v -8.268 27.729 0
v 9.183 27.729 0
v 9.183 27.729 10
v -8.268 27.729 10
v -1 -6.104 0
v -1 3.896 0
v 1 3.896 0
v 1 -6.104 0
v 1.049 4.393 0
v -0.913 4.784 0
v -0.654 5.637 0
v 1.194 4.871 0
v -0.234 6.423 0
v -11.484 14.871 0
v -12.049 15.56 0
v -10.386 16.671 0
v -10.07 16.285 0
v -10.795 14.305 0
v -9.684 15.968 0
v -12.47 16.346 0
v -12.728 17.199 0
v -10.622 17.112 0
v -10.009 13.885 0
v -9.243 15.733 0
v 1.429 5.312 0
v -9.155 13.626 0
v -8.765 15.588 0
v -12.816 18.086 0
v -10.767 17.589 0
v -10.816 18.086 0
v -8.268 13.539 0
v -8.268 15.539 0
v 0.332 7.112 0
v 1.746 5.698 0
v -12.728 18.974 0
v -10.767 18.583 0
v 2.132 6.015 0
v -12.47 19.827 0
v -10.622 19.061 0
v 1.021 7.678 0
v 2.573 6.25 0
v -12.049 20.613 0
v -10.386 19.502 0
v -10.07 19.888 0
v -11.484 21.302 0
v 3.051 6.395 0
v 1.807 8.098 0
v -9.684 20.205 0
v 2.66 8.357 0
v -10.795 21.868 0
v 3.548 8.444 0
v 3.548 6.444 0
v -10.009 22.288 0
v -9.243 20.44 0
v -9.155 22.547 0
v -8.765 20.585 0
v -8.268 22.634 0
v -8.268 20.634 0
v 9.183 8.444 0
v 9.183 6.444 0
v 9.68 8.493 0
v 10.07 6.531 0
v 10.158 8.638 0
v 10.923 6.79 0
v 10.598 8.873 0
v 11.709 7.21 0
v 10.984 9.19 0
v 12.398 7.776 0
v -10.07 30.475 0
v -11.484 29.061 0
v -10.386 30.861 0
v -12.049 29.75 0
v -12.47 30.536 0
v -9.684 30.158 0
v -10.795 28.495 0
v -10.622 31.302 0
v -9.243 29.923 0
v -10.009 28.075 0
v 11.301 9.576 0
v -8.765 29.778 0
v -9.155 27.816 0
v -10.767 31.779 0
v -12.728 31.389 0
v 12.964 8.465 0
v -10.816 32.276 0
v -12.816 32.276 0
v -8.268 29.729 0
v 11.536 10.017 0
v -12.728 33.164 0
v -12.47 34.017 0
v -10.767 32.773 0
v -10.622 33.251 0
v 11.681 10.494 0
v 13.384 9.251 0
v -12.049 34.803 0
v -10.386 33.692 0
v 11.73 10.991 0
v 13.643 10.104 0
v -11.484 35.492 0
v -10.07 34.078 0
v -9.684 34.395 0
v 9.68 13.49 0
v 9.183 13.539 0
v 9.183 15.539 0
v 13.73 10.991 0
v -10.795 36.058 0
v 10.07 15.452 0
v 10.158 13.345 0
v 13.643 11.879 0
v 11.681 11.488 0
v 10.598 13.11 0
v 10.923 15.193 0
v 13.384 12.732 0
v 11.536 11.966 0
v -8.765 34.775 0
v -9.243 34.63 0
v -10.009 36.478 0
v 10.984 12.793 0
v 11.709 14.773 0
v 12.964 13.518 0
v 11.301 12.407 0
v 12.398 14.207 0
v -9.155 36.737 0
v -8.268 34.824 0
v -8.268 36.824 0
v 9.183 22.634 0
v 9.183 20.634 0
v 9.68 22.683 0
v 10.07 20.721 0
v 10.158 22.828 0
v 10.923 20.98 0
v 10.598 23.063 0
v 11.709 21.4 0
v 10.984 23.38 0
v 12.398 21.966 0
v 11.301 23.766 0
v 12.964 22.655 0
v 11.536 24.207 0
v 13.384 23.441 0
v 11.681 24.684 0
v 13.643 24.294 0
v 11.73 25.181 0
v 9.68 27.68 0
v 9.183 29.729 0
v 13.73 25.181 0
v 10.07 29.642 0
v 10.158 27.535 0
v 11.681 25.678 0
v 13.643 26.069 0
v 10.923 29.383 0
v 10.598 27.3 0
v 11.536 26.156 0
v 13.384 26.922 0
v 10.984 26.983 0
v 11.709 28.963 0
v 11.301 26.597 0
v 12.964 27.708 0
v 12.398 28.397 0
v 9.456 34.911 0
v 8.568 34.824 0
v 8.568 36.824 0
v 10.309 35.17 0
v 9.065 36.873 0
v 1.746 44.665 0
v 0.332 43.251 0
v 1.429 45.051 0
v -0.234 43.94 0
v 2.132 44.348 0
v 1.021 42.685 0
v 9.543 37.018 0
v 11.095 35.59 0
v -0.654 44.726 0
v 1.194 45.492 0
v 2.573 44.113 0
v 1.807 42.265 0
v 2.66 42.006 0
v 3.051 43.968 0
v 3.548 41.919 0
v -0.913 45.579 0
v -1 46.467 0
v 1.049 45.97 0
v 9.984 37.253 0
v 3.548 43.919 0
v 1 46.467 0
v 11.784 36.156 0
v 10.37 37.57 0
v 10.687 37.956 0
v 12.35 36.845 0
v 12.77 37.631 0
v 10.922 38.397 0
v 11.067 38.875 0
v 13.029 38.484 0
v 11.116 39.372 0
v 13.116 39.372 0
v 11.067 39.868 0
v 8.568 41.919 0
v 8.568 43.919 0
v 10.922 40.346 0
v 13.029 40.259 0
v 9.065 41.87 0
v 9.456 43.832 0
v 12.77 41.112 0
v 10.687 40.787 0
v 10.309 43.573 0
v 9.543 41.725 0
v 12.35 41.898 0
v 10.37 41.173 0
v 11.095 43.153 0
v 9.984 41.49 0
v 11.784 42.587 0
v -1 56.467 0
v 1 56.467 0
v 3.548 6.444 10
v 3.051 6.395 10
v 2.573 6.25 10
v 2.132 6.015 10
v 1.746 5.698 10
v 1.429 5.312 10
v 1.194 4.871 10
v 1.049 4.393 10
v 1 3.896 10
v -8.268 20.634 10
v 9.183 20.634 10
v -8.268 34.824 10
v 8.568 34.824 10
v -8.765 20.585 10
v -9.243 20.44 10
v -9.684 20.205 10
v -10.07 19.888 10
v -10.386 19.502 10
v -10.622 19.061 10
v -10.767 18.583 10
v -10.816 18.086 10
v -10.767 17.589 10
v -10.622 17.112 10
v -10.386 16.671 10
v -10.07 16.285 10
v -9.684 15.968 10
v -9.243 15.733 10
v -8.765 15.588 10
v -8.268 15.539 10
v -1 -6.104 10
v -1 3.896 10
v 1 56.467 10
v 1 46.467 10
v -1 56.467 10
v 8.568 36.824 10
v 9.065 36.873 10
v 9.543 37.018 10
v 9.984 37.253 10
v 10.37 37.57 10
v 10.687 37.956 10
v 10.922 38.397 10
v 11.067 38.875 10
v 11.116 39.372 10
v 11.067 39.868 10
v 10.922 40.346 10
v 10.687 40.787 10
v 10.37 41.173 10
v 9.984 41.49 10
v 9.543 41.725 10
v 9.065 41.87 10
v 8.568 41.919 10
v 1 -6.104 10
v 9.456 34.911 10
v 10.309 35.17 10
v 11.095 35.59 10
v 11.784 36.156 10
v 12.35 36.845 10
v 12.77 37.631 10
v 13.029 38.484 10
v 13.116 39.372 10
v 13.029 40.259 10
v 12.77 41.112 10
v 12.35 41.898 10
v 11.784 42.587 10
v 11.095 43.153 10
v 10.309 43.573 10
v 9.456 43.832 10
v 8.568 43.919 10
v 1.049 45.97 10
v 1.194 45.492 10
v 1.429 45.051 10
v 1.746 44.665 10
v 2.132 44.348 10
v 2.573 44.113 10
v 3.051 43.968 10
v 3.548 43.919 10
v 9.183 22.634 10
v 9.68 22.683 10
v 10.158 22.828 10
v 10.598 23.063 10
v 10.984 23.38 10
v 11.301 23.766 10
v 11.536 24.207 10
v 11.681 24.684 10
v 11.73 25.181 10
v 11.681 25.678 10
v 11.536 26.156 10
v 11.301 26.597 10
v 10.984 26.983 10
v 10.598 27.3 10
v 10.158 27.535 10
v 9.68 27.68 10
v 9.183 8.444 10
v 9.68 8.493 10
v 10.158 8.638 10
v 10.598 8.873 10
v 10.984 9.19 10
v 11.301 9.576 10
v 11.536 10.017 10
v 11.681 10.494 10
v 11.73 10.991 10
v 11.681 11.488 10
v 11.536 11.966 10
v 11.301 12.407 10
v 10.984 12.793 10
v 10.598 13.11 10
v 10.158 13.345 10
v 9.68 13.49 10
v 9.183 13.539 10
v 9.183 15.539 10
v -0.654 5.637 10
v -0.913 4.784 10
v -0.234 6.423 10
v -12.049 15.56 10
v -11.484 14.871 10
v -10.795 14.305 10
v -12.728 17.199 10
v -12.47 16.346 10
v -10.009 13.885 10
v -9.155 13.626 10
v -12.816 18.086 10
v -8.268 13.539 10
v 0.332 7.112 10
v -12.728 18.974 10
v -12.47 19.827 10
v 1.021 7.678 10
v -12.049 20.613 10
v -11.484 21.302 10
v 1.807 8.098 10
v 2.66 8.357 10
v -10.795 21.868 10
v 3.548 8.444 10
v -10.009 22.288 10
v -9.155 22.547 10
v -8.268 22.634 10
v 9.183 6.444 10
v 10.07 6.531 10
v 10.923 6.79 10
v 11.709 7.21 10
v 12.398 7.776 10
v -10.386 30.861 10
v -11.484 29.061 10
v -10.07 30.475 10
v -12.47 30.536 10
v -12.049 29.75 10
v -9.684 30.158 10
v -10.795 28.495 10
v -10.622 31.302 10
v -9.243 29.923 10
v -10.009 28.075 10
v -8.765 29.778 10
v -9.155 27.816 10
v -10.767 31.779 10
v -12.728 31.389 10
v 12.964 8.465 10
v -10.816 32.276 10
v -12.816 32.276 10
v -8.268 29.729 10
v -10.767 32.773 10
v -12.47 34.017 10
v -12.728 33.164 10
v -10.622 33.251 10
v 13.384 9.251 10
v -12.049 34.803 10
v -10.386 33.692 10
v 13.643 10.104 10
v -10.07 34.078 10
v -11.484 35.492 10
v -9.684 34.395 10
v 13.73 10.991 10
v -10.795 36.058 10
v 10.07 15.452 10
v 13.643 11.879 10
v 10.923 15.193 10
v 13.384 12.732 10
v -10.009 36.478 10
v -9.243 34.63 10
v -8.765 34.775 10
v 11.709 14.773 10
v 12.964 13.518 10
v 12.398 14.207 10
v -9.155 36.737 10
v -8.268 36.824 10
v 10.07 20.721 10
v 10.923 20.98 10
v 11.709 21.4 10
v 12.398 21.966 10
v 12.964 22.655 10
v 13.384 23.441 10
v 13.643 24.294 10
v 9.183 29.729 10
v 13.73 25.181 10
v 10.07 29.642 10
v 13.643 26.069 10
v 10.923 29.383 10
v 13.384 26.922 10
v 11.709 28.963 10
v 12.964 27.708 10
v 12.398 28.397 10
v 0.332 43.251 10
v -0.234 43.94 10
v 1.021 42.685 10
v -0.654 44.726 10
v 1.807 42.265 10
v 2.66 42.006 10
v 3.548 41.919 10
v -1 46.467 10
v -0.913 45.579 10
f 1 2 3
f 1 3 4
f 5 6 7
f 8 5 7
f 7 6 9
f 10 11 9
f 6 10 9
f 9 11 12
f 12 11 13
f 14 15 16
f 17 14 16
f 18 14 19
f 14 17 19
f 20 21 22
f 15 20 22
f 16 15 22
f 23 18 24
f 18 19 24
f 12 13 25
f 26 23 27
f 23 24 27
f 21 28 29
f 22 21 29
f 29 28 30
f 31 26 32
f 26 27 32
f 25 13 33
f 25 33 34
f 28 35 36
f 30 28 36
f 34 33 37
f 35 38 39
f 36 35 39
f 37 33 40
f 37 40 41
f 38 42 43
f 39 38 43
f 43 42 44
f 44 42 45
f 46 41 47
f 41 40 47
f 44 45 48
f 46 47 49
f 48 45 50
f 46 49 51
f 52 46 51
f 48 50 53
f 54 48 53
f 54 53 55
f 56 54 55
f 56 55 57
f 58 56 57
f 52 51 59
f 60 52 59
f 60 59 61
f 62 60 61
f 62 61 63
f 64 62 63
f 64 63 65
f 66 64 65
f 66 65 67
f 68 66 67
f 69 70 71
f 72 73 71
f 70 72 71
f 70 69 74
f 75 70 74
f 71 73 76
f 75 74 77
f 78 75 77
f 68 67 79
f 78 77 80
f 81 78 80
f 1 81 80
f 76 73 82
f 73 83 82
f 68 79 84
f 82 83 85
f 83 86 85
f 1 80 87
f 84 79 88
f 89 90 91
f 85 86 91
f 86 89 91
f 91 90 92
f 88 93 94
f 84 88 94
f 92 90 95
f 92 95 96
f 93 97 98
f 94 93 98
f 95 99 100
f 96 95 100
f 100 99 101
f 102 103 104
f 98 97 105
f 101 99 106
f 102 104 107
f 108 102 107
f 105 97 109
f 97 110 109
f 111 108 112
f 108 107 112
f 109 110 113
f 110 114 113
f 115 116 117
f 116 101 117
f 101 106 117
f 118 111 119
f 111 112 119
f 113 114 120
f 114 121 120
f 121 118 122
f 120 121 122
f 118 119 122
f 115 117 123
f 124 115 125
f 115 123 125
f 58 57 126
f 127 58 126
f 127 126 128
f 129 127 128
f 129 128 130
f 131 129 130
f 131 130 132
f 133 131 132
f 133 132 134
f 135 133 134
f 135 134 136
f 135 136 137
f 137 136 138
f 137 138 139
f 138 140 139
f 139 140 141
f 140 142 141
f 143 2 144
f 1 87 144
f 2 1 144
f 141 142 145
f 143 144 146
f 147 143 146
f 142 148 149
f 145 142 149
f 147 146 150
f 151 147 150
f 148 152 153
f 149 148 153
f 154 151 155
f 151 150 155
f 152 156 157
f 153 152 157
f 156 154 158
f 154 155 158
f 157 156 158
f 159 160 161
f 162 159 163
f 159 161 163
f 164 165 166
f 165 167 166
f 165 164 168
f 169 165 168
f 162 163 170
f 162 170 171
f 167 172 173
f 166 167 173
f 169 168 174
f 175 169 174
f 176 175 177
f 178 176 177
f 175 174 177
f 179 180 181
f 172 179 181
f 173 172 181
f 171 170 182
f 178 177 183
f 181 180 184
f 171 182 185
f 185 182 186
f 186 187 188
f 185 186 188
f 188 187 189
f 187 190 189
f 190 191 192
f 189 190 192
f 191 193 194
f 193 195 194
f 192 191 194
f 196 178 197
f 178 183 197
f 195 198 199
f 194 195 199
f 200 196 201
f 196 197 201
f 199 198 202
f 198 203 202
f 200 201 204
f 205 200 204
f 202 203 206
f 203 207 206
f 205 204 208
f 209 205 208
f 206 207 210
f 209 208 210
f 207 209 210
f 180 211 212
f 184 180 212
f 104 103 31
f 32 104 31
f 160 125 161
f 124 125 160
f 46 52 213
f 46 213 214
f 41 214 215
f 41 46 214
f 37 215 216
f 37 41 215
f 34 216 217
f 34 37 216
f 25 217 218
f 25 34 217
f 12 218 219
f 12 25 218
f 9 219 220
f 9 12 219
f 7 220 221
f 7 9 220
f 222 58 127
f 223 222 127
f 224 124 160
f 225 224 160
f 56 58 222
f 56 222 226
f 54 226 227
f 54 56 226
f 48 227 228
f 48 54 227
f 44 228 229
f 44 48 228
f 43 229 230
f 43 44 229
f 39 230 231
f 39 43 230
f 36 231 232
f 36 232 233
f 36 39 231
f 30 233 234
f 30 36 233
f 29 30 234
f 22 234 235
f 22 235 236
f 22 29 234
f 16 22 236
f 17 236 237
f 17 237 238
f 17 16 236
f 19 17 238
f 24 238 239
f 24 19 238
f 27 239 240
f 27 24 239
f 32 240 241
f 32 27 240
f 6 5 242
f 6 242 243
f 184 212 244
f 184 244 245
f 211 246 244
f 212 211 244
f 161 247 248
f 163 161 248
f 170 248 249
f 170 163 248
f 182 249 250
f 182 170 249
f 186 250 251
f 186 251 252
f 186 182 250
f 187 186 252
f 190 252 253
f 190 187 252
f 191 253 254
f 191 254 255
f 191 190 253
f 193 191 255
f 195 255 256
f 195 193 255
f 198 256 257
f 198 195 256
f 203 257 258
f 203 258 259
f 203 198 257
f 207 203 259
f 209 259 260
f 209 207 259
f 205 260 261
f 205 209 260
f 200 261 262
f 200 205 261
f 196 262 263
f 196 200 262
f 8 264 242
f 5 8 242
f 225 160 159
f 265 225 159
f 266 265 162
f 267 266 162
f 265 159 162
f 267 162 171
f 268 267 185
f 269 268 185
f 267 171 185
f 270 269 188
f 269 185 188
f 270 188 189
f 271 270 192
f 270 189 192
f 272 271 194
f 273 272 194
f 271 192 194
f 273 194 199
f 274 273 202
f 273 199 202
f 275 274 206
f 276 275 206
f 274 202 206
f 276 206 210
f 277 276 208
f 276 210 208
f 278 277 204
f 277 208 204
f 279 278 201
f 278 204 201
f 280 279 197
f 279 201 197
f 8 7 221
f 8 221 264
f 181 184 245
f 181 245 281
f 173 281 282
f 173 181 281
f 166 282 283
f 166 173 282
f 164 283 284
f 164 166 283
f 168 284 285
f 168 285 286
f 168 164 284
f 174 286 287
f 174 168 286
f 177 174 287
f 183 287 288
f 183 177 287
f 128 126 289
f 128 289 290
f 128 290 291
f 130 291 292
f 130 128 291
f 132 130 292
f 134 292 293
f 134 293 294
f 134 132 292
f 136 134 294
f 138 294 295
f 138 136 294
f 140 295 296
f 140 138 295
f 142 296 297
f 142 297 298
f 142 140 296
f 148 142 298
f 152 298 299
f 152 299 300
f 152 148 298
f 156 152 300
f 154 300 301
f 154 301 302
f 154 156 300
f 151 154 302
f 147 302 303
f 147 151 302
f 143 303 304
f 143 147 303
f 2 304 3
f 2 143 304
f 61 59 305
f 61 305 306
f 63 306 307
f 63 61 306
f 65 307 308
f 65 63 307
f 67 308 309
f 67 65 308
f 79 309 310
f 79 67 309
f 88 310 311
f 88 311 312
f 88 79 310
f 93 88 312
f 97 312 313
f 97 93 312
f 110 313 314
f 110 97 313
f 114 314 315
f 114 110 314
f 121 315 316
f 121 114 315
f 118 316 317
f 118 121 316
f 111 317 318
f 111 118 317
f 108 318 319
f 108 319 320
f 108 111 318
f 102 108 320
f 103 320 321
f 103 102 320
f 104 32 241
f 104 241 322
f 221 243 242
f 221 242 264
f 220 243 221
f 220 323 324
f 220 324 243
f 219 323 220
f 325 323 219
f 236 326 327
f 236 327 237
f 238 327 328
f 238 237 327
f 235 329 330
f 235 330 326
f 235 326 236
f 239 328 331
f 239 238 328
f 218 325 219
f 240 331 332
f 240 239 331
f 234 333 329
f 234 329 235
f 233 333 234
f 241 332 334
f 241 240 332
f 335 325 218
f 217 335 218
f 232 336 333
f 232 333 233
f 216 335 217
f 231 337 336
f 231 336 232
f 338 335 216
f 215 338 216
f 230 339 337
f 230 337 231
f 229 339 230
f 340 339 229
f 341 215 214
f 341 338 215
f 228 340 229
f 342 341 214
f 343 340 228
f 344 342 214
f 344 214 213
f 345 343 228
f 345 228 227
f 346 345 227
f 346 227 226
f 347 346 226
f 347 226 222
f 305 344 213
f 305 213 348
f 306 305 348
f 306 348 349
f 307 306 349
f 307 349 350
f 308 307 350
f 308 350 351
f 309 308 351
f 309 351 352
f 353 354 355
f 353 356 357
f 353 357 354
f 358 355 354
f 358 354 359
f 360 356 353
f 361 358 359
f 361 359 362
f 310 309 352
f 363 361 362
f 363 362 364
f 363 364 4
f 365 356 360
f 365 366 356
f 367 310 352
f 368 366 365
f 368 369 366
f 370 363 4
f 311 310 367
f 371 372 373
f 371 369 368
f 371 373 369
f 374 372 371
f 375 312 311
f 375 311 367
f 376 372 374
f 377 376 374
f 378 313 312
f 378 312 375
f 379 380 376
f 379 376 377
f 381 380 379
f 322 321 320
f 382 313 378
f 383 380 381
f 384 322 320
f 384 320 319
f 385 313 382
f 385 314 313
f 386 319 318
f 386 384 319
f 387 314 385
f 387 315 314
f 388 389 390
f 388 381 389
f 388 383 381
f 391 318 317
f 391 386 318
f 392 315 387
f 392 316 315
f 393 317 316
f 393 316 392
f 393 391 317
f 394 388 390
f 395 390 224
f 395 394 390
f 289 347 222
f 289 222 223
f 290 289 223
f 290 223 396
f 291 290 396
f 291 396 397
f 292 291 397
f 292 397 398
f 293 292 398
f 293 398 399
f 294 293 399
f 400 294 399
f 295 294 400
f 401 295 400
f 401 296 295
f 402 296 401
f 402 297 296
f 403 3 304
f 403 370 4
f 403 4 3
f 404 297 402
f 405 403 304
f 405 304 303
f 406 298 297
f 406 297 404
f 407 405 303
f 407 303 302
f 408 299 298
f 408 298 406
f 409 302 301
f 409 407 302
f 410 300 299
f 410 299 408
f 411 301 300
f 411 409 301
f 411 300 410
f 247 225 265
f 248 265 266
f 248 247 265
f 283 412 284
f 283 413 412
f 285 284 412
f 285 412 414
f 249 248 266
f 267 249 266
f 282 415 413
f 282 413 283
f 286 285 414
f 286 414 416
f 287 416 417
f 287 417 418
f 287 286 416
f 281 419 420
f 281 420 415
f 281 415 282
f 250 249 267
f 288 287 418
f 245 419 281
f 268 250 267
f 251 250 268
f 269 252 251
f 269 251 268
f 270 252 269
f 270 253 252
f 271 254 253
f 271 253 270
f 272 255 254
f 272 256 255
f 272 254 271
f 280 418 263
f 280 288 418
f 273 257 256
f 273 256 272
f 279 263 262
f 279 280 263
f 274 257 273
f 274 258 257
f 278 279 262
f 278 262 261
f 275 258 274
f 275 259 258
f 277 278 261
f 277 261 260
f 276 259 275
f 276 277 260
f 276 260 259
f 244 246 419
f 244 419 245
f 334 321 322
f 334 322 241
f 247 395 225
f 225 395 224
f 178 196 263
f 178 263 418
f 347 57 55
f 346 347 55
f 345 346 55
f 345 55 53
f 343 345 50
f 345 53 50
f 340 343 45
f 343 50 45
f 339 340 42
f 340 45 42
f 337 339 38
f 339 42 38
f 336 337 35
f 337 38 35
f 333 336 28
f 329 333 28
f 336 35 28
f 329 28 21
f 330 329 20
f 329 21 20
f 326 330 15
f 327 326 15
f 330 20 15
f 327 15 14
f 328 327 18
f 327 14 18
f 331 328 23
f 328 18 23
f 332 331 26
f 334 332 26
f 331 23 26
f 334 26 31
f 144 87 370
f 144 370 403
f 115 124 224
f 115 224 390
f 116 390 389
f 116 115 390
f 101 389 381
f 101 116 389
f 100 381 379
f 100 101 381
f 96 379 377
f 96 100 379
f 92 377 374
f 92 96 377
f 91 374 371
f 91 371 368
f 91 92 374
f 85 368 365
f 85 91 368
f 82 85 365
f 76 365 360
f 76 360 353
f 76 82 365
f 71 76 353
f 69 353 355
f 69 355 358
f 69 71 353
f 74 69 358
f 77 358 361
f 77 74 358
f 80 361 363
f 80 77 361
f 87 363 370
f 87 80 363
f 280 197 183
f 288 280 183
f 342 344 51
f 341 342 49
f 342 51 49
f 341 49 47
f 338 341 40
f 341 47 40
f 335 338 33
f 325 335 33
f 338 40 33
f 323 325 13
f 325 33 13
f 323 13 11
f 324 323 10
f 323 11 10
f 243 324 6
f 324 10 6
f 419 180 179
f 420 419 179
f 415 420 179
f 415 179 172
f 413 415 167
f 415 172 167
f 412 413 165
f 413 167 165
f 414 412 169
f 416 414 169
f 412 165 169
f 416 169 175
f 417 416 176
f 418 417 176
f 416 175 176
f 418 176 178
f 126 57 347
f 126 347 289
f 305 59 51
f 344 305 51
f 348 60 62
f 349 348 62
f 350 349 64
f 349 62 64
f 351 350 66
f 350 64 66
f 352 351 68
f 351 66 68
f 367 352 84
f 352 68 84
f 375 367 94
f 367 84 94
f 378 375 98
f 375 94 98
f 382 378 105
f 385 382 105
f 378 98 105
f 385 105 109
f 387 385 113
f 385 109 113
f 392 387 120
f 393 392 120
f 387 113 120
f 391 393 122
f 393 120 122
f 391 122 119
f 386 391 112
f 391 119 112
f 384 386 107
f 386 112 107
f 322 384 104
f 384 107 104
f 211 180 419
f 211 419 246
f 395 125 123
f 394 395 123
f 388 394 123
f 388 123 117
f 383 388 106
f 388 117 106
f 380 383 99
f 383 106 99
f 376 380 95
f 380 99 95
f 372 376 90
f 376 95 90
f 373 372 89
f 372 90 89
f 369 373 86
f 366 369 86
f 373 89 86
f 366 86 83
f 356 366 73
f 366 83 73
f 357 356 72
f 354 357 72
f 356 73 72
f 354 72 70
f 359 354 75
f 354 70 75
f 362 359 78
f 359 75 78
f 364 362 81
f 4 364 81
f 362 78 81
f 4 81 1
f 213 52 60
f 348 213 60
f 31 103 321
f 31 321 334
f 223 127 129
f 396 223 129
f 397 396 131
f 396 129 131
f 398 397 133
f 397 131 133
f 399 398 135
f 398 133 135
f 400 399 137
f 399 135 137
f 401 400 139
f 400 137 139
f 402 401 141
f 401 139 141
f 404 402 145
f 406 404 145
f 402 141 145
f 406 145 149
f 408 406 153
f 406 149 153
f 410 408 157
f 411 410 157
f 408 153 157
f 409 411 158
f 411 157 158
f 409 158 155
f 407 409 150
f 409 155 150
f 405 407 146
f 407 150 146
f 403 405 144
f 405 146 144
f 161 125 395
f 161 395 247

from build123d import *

# Parameters (mm, degrees)
PAD_DEPTH = 10


with BuildPart() as part:
    # Sketch → Pad (new body)
    with BuildSketch(Plane.XY):
        with BuildLine():
            ThreePointArc((-8.268256, 22.633972), (-12.815763, 18.086465), (-8.268256, 13.538958))
            Line((9.182689, 13.538958), (-8.268256, 13.538958))
            ThreePointArc((9.182689, 8.443945), (11.730196, 10.991452), (9.182689, 13.538958))
            Line((9.182689, 8.443945), (3.547507, 8.443945))
            ThreePointArc((3.547507, 8.443945), (0.331934, 7.112011), (-1, 3.896438))
            Line((-1, -6.103562), (-1, 3.896438))
            Line((1, -6.103562), (-1, -6.103562))
            Line((1, 3.896438), (1, -6.103562))
            ThreePointArc((3.547507, 6.443945), (1.746147, 5.697797), (1, 3.896438))
            Line((3.547507, 6.443945), (9.182689, 6.443945))
            ThreePointArc((9.182689, 6.443945), (13.730196, 10.991452), (9.182689, 15.538958))
            Line((-8.268256, 15.538958), (9.182689, 15.538958))
            ThreePointArc((-8.268256, 20.633972), (-10.815763, 18.086465), (-8.268256, 15.538958))
            Line((-8.268256, 20.633972), (9.182689, 20.633972))
            ThreePointArc((9.182689, 20.633972), (13.730196, 25.181478), (9.182689, 29.728985))
            Line((-8.268256, 29.728985), (9.182689, 29.728985))
            ThreePointArc((-8.268256, 34.823999), (-10.815763, 32.276492), (-8.268256, 29.728985))
            Line((-8.268256, 34.823999), (8.568406, 34.823999))
            ThreePointArc((8.568406, 34.823999), (13.115912, 39.371505), (8.568406, 43.919012))
            Line((8.568406, 43.919012), (3.547507, 43.919012))
            ThreePointArc((1, 46.466519), (1.746147, 44.66516), (3.547507, 43.919012))
            Line((1, 56.466519), (1, 46.466519))
            Line((-1, 56.466519), (1, 56.466519))
            Line((-1, 46.466519), (-1, 56.466519))
            ThreePointArc((-1, 46.466519), (0.331934, 43.250946), (3.547507, 41.919012))
            Line((8.568406, 41.919012), (3.547507, 41.919012))
            ThreePointArc((8.568406, 36.823999), (11.115912, 39.371505), (8.568406, 41.919012))
            Line((-8.268256, 36.823999), (8.568406, 36.823999))
            ThreePointArc((-8.268256, 36.823999), (-12.815763, 32.276492), (-8.268256, 27.728985))
            Line((9.182689, 27.728985), (-8.268256, 27.728985))
            ThreePointArc((9.182689, 22.633972), (11.730196, 25.181478), (9.182689, 27.728985))
            Line((-8.268256, 22.633972), (9.182689, 22.633972))
        make_face()
    extrude(amount=PAD_DEPTH)


solid = part.part
